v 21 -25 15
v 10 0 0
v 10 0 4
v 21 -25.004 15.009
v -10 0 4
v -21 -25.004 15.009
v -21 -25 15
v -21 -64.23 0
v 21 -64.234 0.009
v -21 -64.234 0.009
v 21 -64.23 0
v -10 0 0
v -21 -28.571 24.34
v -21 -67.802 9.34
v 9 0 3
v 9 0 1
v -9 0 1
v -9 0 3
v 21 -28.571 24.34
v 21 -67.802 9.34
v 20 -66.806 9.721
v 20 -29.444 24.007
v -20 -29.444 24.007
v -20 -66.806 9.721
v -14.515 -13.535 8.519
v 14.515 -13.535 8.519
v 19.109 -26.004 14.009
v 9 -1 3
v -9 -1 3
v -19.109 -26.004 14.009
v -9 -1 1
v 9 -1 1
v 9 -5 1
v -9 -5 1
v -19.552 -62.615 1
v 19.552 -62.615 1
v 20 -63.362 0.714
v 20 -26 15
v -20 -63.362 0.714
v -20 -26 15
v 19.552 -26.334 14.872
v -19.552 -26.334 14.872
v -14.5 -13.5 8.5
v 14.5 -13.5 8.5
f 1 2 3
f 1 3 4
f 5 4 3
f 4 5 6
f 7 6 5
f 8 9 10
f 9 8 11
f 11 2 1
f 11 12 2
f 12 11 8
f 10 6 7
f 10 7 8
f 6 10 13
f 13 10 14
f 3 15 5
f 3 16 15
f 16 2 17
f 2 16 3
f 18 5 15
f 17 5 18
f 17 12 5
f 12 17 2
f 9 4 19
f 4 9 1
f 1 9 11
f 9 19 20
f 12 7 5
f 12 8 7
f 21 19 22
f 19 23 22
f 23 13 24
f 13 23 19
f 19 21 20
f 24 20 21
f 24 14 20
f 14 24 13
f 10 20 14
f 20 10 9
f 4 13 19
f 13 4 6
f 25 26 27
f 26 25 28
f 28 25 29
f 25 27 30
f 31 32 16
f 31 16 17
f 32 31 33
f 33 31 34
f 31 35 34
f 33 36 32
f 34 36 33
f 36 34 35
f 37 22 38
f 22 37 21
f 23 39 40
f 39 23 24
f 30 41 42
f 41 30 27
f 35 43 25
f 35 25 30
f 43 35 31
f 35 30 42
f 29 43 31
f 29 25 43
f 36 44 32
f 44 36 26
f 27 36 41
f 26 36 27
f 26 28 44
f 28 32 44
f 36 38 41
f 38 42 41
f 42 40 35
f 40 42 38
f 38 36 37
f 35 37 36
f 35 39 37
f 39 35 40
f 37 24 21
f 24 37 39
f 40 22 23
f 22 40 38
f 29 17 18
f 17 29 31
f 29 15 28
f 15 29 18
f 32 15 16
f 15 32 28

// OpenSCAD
headZ=16+5-1;

module funDuckBody() {
  hull() {
    translate([-(40+2)/2,25,-5+headZ])
      rotate([-asin((20-5)/42),0,0])
        cube([40+2,40+2,0.01]);
    translate([-10,0,0])
      cube([20,0.01,4]);
  }
  translate([-(40+2)/2,25,-5+headZ])
    rotate([-asin((20-5)/42),0,0])
      cube([40+2,40+2,10]);
}

difference(){
  rotate([0,0,180])  
    funDuckBody();
  rotate([0,0,180]) {
    difference() {
      cube([100,200,100],center=true);
      minkowski() {
        difference() {
          cube([100,200,100],center=true);
            funDuckBody(); 
        }
        cube(2,center=true);
      }
    }
    translate([-(40)/2,25+1,-5+headZ])
      rotate([-asin((20-5)/42),0,0])
        cube([40,40,10]);
    translate([-9,0,1])
        cube([18,5,2]);
  }
}
